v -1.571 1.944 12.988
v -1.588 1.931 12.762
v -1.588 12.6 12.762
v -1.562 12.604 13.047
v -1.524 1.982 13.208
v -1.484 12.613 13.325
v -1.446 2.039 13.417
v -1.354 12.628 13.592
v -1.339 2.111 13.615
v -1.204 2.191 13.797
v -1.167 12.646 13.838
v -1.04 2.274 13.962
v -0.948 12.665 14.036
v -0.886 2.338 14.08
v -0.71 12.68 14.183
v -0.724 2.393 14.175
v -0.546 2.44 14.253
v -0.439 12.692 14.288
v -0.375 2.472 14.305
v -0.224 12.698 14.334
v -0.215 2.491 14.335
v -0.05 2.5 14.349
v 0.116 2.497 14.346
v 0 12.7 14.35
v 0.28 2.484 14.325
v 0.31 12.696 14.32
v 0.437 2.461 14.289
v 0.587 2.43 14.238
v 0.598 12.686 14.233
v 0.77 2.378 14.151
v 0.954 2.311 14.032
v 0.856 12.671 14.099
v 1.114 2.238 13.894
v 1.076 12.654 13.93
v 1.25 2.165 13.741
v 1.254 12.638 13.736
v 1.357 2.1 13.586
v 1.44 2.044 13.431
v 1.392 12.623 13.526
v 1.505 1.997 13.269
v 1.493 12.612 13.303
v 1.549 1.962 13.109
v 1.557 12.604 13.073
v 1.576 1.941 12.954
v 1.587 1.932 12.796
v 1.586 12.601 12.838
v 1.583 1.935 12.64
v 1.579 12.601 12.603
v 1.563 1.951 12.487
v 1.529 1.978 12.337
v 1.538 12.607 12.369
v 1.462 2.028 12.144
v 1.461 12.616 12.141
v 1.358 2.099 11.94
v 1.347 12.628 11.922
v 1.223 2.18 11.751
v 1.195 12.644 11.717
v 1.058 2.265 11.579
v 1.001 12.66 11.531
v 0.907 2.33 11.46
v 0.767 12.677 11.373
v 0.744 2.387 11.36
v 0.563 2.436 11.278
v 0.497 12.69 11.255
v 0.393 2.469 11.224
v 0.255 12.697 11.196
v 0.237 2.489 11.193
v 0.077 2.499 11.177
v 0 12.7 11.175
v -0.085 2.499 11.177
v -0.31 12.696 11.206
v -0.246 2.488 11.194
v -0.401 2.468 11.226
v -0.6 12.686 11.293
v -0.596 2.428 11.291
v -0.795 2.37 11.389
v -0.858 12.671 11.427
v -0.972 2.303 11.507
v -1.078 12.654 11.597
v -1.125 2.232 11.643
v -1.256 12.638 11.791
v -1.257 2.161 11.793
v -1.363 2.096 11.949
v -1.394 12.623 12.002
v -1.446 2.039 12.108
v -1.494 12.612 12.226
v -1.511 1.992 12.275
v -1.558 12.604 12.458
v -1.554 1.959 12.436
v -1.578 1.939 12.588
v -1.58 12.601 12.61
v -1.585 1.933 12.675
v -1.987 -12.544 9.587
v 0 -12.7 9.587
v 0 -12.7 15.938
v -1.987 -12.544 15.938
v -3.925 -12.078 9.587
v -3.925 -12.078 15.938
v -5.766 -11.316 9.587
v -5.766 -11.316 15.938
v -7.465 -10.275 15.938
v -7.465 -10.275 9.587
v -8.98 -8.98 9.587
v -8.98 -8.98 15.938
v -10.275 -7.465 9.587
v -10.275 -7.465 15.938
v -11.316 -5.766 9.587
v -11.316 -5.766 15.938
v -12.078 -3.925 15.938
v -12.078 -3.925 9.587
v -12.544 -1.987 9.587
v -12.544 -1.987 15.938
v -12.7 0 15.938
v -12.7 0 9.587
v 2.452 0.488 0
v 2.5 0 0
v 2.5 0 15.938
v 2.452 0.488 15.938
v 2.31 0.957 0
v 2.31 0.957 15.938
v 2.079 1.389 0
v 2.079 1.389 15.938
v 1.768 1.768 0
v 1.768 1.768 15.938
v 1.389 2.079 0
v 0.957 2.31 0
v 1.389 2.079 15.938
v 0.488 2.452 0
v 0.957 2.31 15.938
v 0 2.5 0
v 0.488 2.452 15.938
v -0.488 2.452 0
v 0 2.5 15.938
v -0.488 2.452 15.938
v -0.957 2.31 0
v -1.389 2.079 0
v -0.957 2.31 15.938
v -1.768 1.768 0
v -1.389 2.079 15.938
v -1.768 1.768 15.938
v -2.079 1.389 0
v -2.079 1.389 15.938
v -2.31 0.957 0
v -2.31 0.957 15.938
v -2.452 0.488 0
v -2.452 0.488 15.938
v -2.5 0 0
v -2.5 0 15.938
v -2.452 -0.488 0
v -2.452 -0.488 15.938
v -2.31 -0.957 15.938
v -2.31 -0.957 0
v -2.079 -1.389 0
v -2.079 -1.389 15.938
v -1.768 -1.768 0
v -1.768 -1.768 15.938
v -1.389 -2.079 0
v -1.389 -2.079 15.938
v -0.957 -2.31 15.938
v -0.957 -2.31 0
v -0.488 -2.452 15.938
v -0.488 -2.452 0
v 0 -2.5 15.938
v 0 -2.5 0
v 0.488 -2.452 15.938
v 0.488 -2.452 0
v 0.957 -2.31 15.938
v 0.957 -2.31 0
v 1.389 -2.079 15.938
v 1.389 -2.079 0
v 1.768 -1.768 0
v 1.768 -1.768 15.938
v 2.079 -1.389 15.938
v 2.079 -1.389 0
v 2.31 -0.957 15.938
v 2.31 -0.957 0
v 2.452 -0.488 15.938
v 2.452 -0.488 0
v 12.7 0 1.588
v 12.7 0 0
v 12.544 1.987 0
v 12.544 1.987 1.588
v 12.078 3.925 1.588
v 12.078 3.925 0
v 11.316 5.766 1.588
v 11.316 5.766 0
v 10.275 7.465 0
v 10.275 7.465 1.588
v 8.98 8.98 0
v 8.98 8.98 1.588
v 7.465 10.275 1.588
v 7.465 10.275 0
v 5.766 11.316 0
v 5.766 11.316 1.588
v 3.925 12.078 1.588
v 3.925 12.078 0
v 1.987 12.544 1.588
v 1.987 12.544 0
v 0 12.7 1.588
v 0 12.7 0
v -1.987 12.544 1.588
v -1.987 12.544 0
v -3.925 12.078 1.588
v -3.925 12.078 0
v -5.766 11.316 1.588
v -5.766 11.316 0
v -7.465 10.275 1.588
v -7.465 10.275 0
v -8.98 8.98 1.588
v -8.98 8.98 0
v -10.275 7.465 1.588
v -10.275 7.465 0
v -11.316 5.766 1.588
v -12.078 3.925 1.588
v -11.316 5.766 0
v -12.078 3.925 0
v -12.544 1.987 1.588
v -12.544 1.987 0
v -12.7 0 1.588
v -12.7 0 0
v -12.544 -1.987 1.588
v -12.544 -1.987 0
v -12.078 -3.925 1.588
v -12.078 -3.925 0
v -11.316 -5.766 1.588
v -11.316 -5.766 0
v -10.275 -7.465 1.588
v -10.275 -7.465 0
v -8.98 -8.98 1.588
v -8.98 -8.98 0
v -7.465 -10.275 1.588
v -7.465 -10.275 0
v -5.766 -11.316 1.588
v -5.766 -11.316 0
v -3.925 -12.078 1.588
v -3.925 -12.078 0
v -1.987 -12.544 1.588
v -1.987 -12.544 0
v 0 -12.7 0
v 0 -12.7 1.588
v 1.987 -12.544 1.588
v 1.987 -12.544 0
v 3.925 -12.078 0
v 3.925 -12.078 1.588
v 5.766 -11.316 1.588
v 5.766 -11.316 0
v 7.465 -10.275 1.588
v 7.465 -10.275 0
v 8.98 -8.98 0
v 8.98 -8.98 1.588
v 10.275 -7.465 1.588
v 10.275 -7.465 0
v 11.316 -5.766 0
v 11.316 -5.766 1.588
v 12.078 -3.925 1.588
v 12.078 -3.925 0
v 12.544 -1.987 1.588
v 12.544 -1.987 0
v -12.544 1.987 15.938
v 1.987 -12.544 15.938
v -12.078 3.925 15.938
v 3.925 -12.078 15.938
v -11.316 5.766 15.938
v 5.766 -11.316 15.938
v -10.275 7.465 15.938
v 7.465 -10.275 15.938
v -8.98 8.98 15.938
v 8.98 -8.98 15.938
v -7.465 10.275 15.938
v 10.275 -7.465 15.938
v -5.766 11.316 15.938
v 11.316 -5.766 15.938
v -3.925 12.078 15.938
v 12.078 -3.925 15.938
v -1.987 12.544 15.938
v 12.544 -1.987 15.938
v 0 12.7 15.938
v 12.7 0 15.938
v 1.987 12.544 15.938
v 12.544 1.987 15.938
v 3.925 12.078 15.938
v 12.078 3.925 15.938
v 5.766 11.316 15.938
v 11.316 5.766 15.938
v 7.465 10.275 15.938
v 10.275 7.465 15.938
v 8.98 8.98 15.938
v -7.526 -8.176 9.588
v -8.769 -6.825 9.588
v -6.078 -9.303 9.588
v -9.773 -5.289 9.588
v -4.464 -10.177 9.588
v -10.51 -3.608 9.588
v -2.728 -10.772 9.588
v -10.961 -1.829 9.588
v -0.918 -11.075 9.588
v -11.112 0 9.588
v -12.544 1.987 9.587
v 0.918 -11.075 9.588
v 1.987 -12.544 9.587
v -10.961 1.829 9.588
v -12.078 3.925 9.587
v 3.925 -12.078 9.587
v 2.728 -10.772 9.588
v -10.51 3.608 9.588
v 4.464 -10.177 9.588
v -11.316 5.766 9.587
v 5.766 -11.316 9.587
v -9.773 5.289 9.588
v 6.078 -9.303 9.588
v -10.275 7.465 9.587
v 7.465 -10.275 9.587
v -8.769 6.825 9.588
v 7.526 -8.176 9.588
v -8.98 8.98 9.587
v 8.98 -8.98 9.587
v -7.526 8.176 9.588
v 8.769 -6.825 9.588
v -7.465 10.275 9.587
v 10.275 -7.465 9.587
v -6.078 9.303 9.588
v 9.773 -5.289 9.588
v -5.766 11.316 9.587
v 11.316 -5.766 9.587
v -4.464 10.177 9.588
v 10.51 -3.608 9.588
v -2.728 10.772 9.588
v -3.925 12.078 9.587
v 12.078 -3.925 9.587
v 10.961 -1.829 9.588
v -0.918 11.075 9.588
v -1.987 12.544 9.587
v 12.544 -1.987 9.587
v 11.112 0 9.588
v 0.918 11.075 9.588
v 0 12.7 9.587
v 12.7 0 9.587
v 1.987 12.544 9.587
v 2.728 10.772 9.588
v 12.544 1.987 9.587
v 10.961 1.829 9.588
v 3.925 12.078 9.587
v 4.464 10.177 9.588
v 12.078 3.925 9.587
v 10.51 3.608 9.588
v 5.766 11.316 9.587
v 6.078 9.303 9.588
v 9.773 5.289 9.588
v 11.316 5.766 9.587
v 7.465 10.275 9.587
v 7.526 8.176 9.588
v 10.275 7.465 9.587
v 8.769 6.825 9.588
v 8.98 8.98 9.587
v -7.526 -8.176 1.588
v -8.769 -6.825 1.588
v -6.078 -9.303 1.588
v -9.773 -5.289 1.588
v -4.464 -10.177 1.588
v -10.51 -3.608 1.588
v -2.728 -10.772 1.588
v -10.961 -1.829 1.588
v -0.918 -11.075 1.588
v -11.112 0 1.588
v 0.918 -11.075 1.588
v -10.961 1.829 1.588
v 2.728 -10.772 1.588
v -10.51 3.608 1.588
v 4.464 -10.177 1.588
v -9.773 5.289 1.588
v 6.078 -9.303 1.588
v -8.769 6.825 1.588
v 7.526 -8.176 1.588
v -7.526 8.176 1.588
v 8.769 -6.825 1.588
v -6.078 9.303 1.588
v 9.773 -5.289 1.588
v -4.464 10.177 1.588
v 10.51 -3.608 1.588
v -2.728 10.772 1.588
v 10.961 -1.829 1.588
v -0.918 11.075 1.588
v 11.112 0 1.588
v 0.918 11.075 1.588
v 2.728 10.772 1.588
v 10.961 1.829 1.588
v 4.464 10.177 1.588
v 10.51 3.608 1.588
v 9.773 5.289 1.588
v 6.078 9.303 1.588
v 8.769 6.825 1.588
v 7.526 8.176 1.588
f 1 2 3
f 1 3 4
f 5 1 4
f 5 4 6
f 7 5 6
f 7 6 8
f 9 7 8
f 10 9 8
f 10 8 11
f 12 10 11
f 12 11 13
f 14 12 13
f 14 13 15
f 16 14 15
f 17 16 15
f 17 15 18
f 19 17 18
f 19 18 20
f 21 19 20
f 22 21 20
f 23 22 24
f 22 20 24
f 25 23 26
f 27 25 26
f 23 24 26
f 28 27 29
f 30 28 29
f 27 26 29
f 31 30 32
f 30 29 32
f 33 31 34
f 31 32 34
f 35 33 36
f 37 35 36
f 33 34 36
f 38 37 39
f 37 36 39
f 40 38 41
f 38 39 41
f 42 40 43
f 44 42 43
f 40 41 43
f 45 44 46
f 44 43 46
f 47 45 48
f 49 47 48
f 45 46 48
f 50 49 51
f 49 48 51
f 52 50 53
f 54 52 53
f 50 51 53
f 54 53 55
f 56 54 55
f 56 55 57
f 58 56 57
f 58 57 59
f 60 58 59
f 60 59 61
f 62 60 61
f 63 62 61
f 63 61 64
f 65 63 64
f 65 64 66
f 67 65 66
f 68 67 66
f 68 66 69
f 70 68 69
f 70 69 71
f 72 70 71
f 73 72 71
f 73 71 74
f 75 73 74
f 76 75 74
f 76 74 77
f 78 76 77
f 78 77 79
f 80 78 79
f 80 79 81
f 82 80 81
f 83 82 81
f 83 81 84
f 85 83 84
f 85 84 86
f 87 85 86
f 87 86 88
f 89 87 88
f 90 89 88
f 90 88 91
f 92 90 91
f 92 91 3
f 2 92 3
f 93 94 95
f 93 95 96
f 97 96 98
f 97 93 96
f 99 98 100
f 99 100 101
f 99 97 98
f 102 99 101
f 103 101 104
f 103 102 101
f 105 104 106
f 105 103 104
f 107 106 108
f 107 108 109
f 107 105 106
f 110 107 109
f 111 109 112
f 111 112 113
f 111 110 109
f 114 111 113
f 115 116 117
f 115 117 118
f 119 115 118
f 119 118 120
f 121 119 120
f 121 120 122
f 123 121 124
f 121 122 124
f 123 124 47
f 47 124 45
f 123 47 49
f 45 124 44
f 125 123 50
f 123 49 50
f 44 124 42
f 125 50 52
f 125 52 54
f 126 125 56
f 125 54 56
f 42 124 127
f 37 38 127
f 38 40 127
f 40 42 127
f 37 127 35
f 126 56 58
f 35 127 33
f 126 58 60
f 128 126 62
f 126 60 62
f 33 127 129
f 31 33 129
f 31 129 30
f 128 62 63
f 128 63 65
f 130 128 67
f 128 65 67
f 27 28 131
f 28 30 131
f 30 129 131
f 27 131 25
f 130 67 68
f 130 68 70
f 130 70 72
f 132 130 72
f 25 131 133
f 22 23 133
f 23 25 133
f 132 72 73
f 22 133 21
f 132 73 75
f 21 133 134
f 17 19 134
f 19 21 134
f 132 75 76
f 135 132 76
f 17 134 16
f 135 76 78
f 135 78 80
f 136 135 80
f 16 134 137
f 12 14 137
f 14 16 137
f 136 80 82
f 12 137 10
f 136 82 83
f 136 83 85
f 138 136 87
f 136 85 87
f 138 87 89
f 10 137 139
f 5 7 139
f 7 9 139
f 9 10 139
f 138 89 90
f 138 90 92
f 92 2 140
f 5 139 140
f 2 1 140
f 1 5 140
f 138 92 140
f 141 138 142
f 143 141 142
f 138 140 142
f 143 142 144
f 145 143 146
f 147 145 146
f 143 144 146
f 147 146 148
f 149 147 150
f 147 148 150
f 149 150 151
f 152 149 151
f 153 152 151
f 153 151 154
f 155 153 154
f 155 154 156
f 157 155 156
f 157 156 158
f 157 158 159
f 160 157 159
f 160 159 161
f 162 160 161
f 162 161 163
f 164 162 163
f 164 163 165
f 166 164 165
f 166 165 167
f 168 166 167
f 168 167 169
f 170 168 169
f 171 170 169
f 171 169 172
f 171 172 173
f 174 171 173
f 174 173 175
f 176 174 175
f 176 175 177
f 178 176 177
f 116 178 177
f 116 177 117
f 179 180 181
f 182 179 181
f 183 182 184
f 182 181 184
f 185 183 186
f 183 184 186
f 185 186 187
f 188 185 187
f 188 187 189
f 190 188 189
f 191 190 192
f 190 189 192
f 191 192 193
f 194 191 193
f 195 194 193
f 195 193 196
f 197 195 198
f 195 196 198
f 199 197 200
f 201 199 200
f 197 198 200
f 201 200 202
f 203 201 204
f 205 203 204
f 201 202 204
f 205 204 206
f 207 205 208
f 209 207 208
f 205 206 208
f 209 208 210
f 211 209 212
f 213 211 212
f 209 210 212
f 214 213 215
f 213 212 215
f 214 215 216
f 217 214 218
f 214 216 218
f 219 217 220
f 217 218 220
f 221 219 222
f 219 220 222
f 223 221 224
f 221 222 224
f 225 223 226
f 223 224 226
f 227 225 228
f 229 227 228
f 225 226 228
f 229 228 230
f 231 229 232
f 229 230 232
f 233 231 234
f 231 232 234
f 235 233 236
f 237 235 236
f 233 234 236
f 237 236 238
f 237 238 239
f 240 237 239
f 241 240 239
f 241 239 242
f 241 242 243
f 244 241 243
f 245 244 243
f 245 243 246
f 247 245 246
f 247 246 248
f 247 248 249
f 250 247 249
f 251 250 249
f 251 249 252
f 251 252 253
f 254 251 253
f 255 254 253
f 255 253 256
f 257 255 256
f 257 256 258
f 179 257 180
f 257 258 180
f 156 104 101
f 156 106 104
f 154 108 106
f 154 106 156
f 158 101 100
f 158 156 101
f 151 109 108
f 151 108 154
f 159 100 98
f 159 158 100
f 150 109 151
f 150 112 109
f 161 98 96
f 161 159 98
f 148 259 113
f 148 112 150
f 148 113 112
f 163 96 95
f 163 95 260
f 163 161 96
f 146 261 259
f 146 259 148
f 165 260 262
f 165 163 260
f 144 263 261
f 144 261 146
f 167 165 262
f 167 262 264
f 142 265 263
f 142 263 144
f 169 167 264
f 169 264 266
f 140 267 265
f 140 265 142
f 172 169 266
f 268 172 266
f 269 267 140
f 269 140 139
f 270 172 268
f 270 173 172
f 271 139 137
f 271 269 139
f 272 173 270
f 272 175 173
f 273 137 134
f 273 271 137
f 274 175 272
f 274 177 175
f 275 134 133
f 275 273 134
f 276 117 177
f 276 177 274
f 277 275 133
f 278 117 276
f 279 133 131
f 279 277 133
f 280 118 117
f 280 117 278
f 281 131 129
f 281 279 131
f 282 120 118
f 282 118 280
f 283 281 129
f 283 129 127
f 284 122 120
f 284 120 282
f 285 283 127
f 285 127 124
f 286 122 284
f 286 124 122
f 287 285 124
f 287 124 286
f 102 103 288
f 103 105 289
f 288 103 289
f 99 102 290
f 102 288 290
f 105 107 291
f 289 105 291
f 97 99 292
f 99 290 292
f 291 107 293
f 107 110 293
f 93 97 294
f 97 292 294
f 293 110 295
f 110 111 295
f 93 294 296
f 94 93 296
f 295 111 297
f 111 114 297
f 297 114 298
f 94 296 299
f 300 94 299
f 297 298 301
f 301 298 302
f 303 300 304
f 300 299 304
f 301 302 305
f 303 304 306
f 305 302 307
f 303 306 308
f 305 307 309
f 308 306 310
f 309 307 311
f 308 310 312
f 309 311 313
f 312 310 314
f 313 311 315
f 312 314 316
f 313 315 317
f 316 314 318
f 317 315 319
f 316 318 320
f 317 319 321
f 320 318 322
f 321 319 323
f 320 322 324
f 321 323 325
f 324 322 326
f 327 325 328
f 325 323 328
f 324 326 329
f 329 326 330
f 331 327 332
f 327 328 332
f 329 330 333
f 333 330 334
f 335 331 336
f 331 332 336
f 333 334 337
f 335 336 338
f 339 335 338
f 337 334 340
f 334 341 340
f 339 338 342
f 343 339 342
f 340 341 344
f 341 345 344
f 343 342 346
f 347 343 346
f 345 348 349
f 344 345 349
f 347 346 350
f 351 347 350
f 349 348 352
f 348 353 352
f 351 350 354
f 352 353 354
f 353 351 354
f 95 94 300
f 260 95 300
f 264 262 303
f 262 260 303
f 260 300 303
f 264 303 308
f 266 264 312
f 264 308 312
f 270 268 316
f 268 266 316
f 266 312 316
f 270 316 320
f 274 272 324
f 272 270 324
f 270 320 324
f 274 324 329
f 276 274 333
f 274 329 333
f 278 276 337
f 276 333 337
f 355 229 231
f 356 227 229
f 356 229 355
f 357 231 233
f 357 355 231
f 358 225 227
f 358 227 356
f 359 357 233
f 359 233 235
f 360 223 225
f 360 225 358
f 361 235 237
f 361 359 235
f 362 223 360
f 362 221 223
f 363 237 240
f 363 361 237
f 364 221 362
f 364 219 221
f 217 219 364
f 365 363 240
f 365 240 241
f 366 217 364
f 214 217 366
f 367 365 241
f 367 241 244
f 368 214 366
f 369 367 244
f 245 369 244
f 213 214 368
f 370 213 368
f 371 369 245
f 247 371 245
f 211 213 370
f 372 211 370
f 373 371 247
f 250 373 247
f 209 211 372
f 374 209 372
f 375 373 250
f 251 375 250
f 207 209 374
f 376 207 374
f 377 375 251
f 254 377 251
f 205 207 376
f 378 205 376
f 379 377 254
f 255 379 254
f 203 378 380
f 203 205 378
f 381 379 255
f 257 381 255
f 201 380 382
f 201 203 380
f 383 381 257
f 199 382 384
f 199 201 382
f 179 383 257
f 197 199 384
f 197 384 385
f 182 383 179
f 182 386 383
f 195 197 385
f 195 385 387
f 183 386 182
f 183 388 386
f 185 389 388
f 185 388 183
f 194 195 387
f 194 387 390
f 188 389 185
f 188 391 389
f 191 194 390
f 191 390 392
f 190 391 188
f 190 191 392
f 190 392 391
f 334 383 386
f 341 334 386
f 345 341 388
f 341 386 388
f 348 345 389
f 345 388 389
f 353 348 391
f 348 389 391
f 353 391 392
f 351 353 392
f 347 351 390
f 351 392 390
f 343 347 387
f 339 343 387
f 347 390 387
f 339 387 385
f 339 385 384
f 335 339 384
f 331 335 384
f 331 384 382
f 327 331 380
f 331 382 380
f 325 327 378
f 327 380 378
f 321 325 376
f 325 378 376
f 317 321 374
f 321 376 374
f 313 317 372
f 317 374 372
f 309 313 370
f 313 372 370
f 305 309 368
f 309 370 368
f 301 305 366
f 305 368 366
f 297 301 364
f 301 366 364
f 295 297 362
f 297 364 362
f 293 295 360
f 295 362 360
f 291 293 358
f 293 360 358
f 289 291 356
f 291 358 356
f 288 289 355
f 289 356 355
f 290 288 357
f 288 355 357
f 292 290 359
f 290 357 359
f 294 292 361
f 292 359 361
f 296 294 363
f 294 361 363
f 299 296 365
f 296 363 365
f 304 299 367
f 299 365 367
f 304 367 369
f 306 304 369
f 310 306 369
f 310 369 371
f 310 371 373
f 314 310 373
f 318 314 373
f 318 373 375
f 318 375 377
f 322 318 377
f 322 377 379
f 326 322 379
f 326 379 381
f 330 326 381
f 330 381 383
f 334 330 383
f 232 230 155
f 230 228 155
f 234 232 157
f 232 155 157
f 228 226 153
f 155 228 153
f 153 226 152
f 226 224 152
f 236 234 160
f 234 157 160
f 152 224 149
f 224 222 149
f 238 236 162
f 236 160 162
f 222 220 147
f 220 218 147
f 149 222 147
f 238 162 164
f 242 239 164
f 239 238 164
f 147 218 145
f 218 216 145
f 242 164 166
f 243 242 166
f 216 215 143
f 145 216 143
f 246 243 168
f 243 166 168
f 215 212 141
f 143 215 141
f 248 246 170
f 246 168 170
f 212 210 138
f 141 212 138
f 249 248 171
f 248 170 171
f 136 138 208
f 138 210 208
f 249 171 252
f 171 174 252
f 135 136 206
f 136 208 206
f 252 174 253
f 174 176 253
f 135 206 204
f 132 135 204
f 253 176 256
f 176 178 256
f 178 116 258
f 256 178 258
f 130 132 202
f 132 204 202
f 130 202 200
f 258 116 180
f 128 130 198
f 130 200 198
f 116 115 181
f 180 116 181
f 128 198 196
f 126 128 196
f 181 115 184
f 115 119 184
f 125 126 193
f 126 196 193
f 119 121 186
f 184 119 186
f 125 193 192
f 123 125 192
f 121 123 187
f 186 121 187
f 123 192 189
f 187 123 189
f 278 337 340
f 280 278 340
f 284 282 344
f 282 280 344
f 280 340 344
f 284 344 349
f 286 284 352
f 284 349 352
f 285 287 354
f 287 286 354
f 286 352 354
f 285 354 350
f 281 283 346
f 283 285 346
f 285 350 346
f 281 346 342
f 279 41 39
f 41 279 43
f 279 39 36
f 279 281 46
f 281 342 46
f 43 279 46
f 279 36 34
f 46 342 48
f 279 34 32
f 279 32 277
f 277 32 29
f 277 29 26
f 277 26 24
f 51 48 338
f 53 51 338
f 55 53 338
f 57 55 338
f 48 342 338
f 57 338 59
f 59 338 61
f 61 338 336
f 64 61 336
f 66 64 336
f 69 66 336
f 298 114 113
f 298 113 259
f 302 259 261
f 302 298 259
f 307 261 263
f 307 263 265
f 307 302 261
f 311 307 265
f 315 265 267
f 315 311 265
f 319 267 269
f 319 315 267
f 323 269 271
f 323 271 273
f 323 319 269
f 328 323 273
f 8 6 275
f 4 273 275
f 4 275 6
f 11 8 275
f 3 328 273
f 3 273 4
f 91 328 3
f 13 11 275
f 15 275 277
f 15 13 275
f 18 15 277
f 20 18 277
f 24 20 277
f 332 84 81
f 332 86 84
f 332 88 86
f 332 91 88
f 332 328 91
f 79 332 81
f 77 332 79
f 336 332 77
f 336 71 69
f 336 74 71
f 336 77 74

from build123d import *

# Parameters (mm, degrees)
F0_R         = 12.7
F1_DEPTH     = 1.5875
F2_R         = 11.1125
F3_DEPTH     = 8
F4_W         = 25.4
F4_H         = 25.4
F5_DEPTH     = 6.35
F6_R         = 2.5
F7_DEPTH     = 15.9375
F8_R         = 1.5875
F9_REACH     = 29.8911280605
F10_T1_DEPTH = 69.85


# Not quite as in the source:
# - a fillet or chamfer that OpenCascade refuses, or shapes differently, is made with other operations: its cross-section is extruded or revolved along the edge and cut away or added


with BuildPart() as f1:
    # F0 (on Top) → F1 (new body)
    with BuildSketch(Plane.XY):
        Circle(F0_R)
    extrude(amount=F1_DEPTH)

    # F2 (on face) → F3 (join)
    with BuildSketch(Plane.XY.offset(1.5875)):
        Circle(F2_R)
    extrude(amount=F3_DEPTH)

    # F4 (on face) → F5 (join)
    with BuildSketch(Plane.XY.offset(9.5875)):
        Rectangle(F4_W, F4_H)
    extrude(amount=F5_DEPTH)

    # F6 (on face) → F7 (cut, through all)
    with BuildSketch(Plane.XY.offset(15.9375)):
        Circle(F6_R)
    extrude(amount=-F7_DEPTH, mode=Mode.SUBTRACT)

    f9_end = f1.faces().sort_by_distance((-2.5, 0, 7.96875))[0]
    # F8 (on face) → F9 (cut, up to a face of the model that its end follows)
    with BuildSketch(Plane(origin=(0, 12.7, 0), x_dir=(-1, 0, 0), z_dir=(0, 1, 0))):
        with Locations((0, 12.7625)):
            Circle(F8_R)
    f9_long = extrude(amount=-F9_REACH, mode=Mode.PRIVATE)
    add(split(f9_long, bisect_by=f9_end, keep=Keep.ALL, mode=Mode.PRIVATE).solids().sort_by_distance((0, 12.7, 12.7625))[0], mode=Mode.SUBTRACT)

    # F10: fillet of radius 12.7 on 4 edges, made by hand

    # F10_s2 → F10_t1 (cut)
    with BuildSketch(Plane.XY.offset(-22.1625)):
        with BuildLine():
            ThreePointArc((-12.7, 0), (-8.9802561211, 8.9802561211), (0, 12.7))
            Line((0, 12.7), (-12.7, 12.7))
            Line((-12.7, 12.7), (-12.7, 0))
        make_face()
        with BuildLine():
            ThreePointArc((0, -12.7), (-8.9802561211, -8.9802561211), (-12.7, 0))
            Line((-12.7, 0), (-12.7, -12.7))
            Line((-12.7, -12.7), (0, -12.7))
        make_face()
        with BuildLine():
            ThreePointArc((12.7, 0), (8.9802561211, 8.9802561211), (0, 12.7))
            Line((0, 12.7), (12.7, 12.7))
            Line((12.7, 12.7), (12.7, 0))
        make_face()
        with BuildLine():
            ThreePointArc((0, -12.7), (8.9802561211, -8.9802561211), (12.7, 0))
            Line((12.7, 0), (12.7, -12.7))
            Line((12.7, -12.7), (0, -12.7))
        make_face()
    extrude(amount=F10_T1_DEPTH, mode=Mode.SUBTRACT)


solid = f1.part
